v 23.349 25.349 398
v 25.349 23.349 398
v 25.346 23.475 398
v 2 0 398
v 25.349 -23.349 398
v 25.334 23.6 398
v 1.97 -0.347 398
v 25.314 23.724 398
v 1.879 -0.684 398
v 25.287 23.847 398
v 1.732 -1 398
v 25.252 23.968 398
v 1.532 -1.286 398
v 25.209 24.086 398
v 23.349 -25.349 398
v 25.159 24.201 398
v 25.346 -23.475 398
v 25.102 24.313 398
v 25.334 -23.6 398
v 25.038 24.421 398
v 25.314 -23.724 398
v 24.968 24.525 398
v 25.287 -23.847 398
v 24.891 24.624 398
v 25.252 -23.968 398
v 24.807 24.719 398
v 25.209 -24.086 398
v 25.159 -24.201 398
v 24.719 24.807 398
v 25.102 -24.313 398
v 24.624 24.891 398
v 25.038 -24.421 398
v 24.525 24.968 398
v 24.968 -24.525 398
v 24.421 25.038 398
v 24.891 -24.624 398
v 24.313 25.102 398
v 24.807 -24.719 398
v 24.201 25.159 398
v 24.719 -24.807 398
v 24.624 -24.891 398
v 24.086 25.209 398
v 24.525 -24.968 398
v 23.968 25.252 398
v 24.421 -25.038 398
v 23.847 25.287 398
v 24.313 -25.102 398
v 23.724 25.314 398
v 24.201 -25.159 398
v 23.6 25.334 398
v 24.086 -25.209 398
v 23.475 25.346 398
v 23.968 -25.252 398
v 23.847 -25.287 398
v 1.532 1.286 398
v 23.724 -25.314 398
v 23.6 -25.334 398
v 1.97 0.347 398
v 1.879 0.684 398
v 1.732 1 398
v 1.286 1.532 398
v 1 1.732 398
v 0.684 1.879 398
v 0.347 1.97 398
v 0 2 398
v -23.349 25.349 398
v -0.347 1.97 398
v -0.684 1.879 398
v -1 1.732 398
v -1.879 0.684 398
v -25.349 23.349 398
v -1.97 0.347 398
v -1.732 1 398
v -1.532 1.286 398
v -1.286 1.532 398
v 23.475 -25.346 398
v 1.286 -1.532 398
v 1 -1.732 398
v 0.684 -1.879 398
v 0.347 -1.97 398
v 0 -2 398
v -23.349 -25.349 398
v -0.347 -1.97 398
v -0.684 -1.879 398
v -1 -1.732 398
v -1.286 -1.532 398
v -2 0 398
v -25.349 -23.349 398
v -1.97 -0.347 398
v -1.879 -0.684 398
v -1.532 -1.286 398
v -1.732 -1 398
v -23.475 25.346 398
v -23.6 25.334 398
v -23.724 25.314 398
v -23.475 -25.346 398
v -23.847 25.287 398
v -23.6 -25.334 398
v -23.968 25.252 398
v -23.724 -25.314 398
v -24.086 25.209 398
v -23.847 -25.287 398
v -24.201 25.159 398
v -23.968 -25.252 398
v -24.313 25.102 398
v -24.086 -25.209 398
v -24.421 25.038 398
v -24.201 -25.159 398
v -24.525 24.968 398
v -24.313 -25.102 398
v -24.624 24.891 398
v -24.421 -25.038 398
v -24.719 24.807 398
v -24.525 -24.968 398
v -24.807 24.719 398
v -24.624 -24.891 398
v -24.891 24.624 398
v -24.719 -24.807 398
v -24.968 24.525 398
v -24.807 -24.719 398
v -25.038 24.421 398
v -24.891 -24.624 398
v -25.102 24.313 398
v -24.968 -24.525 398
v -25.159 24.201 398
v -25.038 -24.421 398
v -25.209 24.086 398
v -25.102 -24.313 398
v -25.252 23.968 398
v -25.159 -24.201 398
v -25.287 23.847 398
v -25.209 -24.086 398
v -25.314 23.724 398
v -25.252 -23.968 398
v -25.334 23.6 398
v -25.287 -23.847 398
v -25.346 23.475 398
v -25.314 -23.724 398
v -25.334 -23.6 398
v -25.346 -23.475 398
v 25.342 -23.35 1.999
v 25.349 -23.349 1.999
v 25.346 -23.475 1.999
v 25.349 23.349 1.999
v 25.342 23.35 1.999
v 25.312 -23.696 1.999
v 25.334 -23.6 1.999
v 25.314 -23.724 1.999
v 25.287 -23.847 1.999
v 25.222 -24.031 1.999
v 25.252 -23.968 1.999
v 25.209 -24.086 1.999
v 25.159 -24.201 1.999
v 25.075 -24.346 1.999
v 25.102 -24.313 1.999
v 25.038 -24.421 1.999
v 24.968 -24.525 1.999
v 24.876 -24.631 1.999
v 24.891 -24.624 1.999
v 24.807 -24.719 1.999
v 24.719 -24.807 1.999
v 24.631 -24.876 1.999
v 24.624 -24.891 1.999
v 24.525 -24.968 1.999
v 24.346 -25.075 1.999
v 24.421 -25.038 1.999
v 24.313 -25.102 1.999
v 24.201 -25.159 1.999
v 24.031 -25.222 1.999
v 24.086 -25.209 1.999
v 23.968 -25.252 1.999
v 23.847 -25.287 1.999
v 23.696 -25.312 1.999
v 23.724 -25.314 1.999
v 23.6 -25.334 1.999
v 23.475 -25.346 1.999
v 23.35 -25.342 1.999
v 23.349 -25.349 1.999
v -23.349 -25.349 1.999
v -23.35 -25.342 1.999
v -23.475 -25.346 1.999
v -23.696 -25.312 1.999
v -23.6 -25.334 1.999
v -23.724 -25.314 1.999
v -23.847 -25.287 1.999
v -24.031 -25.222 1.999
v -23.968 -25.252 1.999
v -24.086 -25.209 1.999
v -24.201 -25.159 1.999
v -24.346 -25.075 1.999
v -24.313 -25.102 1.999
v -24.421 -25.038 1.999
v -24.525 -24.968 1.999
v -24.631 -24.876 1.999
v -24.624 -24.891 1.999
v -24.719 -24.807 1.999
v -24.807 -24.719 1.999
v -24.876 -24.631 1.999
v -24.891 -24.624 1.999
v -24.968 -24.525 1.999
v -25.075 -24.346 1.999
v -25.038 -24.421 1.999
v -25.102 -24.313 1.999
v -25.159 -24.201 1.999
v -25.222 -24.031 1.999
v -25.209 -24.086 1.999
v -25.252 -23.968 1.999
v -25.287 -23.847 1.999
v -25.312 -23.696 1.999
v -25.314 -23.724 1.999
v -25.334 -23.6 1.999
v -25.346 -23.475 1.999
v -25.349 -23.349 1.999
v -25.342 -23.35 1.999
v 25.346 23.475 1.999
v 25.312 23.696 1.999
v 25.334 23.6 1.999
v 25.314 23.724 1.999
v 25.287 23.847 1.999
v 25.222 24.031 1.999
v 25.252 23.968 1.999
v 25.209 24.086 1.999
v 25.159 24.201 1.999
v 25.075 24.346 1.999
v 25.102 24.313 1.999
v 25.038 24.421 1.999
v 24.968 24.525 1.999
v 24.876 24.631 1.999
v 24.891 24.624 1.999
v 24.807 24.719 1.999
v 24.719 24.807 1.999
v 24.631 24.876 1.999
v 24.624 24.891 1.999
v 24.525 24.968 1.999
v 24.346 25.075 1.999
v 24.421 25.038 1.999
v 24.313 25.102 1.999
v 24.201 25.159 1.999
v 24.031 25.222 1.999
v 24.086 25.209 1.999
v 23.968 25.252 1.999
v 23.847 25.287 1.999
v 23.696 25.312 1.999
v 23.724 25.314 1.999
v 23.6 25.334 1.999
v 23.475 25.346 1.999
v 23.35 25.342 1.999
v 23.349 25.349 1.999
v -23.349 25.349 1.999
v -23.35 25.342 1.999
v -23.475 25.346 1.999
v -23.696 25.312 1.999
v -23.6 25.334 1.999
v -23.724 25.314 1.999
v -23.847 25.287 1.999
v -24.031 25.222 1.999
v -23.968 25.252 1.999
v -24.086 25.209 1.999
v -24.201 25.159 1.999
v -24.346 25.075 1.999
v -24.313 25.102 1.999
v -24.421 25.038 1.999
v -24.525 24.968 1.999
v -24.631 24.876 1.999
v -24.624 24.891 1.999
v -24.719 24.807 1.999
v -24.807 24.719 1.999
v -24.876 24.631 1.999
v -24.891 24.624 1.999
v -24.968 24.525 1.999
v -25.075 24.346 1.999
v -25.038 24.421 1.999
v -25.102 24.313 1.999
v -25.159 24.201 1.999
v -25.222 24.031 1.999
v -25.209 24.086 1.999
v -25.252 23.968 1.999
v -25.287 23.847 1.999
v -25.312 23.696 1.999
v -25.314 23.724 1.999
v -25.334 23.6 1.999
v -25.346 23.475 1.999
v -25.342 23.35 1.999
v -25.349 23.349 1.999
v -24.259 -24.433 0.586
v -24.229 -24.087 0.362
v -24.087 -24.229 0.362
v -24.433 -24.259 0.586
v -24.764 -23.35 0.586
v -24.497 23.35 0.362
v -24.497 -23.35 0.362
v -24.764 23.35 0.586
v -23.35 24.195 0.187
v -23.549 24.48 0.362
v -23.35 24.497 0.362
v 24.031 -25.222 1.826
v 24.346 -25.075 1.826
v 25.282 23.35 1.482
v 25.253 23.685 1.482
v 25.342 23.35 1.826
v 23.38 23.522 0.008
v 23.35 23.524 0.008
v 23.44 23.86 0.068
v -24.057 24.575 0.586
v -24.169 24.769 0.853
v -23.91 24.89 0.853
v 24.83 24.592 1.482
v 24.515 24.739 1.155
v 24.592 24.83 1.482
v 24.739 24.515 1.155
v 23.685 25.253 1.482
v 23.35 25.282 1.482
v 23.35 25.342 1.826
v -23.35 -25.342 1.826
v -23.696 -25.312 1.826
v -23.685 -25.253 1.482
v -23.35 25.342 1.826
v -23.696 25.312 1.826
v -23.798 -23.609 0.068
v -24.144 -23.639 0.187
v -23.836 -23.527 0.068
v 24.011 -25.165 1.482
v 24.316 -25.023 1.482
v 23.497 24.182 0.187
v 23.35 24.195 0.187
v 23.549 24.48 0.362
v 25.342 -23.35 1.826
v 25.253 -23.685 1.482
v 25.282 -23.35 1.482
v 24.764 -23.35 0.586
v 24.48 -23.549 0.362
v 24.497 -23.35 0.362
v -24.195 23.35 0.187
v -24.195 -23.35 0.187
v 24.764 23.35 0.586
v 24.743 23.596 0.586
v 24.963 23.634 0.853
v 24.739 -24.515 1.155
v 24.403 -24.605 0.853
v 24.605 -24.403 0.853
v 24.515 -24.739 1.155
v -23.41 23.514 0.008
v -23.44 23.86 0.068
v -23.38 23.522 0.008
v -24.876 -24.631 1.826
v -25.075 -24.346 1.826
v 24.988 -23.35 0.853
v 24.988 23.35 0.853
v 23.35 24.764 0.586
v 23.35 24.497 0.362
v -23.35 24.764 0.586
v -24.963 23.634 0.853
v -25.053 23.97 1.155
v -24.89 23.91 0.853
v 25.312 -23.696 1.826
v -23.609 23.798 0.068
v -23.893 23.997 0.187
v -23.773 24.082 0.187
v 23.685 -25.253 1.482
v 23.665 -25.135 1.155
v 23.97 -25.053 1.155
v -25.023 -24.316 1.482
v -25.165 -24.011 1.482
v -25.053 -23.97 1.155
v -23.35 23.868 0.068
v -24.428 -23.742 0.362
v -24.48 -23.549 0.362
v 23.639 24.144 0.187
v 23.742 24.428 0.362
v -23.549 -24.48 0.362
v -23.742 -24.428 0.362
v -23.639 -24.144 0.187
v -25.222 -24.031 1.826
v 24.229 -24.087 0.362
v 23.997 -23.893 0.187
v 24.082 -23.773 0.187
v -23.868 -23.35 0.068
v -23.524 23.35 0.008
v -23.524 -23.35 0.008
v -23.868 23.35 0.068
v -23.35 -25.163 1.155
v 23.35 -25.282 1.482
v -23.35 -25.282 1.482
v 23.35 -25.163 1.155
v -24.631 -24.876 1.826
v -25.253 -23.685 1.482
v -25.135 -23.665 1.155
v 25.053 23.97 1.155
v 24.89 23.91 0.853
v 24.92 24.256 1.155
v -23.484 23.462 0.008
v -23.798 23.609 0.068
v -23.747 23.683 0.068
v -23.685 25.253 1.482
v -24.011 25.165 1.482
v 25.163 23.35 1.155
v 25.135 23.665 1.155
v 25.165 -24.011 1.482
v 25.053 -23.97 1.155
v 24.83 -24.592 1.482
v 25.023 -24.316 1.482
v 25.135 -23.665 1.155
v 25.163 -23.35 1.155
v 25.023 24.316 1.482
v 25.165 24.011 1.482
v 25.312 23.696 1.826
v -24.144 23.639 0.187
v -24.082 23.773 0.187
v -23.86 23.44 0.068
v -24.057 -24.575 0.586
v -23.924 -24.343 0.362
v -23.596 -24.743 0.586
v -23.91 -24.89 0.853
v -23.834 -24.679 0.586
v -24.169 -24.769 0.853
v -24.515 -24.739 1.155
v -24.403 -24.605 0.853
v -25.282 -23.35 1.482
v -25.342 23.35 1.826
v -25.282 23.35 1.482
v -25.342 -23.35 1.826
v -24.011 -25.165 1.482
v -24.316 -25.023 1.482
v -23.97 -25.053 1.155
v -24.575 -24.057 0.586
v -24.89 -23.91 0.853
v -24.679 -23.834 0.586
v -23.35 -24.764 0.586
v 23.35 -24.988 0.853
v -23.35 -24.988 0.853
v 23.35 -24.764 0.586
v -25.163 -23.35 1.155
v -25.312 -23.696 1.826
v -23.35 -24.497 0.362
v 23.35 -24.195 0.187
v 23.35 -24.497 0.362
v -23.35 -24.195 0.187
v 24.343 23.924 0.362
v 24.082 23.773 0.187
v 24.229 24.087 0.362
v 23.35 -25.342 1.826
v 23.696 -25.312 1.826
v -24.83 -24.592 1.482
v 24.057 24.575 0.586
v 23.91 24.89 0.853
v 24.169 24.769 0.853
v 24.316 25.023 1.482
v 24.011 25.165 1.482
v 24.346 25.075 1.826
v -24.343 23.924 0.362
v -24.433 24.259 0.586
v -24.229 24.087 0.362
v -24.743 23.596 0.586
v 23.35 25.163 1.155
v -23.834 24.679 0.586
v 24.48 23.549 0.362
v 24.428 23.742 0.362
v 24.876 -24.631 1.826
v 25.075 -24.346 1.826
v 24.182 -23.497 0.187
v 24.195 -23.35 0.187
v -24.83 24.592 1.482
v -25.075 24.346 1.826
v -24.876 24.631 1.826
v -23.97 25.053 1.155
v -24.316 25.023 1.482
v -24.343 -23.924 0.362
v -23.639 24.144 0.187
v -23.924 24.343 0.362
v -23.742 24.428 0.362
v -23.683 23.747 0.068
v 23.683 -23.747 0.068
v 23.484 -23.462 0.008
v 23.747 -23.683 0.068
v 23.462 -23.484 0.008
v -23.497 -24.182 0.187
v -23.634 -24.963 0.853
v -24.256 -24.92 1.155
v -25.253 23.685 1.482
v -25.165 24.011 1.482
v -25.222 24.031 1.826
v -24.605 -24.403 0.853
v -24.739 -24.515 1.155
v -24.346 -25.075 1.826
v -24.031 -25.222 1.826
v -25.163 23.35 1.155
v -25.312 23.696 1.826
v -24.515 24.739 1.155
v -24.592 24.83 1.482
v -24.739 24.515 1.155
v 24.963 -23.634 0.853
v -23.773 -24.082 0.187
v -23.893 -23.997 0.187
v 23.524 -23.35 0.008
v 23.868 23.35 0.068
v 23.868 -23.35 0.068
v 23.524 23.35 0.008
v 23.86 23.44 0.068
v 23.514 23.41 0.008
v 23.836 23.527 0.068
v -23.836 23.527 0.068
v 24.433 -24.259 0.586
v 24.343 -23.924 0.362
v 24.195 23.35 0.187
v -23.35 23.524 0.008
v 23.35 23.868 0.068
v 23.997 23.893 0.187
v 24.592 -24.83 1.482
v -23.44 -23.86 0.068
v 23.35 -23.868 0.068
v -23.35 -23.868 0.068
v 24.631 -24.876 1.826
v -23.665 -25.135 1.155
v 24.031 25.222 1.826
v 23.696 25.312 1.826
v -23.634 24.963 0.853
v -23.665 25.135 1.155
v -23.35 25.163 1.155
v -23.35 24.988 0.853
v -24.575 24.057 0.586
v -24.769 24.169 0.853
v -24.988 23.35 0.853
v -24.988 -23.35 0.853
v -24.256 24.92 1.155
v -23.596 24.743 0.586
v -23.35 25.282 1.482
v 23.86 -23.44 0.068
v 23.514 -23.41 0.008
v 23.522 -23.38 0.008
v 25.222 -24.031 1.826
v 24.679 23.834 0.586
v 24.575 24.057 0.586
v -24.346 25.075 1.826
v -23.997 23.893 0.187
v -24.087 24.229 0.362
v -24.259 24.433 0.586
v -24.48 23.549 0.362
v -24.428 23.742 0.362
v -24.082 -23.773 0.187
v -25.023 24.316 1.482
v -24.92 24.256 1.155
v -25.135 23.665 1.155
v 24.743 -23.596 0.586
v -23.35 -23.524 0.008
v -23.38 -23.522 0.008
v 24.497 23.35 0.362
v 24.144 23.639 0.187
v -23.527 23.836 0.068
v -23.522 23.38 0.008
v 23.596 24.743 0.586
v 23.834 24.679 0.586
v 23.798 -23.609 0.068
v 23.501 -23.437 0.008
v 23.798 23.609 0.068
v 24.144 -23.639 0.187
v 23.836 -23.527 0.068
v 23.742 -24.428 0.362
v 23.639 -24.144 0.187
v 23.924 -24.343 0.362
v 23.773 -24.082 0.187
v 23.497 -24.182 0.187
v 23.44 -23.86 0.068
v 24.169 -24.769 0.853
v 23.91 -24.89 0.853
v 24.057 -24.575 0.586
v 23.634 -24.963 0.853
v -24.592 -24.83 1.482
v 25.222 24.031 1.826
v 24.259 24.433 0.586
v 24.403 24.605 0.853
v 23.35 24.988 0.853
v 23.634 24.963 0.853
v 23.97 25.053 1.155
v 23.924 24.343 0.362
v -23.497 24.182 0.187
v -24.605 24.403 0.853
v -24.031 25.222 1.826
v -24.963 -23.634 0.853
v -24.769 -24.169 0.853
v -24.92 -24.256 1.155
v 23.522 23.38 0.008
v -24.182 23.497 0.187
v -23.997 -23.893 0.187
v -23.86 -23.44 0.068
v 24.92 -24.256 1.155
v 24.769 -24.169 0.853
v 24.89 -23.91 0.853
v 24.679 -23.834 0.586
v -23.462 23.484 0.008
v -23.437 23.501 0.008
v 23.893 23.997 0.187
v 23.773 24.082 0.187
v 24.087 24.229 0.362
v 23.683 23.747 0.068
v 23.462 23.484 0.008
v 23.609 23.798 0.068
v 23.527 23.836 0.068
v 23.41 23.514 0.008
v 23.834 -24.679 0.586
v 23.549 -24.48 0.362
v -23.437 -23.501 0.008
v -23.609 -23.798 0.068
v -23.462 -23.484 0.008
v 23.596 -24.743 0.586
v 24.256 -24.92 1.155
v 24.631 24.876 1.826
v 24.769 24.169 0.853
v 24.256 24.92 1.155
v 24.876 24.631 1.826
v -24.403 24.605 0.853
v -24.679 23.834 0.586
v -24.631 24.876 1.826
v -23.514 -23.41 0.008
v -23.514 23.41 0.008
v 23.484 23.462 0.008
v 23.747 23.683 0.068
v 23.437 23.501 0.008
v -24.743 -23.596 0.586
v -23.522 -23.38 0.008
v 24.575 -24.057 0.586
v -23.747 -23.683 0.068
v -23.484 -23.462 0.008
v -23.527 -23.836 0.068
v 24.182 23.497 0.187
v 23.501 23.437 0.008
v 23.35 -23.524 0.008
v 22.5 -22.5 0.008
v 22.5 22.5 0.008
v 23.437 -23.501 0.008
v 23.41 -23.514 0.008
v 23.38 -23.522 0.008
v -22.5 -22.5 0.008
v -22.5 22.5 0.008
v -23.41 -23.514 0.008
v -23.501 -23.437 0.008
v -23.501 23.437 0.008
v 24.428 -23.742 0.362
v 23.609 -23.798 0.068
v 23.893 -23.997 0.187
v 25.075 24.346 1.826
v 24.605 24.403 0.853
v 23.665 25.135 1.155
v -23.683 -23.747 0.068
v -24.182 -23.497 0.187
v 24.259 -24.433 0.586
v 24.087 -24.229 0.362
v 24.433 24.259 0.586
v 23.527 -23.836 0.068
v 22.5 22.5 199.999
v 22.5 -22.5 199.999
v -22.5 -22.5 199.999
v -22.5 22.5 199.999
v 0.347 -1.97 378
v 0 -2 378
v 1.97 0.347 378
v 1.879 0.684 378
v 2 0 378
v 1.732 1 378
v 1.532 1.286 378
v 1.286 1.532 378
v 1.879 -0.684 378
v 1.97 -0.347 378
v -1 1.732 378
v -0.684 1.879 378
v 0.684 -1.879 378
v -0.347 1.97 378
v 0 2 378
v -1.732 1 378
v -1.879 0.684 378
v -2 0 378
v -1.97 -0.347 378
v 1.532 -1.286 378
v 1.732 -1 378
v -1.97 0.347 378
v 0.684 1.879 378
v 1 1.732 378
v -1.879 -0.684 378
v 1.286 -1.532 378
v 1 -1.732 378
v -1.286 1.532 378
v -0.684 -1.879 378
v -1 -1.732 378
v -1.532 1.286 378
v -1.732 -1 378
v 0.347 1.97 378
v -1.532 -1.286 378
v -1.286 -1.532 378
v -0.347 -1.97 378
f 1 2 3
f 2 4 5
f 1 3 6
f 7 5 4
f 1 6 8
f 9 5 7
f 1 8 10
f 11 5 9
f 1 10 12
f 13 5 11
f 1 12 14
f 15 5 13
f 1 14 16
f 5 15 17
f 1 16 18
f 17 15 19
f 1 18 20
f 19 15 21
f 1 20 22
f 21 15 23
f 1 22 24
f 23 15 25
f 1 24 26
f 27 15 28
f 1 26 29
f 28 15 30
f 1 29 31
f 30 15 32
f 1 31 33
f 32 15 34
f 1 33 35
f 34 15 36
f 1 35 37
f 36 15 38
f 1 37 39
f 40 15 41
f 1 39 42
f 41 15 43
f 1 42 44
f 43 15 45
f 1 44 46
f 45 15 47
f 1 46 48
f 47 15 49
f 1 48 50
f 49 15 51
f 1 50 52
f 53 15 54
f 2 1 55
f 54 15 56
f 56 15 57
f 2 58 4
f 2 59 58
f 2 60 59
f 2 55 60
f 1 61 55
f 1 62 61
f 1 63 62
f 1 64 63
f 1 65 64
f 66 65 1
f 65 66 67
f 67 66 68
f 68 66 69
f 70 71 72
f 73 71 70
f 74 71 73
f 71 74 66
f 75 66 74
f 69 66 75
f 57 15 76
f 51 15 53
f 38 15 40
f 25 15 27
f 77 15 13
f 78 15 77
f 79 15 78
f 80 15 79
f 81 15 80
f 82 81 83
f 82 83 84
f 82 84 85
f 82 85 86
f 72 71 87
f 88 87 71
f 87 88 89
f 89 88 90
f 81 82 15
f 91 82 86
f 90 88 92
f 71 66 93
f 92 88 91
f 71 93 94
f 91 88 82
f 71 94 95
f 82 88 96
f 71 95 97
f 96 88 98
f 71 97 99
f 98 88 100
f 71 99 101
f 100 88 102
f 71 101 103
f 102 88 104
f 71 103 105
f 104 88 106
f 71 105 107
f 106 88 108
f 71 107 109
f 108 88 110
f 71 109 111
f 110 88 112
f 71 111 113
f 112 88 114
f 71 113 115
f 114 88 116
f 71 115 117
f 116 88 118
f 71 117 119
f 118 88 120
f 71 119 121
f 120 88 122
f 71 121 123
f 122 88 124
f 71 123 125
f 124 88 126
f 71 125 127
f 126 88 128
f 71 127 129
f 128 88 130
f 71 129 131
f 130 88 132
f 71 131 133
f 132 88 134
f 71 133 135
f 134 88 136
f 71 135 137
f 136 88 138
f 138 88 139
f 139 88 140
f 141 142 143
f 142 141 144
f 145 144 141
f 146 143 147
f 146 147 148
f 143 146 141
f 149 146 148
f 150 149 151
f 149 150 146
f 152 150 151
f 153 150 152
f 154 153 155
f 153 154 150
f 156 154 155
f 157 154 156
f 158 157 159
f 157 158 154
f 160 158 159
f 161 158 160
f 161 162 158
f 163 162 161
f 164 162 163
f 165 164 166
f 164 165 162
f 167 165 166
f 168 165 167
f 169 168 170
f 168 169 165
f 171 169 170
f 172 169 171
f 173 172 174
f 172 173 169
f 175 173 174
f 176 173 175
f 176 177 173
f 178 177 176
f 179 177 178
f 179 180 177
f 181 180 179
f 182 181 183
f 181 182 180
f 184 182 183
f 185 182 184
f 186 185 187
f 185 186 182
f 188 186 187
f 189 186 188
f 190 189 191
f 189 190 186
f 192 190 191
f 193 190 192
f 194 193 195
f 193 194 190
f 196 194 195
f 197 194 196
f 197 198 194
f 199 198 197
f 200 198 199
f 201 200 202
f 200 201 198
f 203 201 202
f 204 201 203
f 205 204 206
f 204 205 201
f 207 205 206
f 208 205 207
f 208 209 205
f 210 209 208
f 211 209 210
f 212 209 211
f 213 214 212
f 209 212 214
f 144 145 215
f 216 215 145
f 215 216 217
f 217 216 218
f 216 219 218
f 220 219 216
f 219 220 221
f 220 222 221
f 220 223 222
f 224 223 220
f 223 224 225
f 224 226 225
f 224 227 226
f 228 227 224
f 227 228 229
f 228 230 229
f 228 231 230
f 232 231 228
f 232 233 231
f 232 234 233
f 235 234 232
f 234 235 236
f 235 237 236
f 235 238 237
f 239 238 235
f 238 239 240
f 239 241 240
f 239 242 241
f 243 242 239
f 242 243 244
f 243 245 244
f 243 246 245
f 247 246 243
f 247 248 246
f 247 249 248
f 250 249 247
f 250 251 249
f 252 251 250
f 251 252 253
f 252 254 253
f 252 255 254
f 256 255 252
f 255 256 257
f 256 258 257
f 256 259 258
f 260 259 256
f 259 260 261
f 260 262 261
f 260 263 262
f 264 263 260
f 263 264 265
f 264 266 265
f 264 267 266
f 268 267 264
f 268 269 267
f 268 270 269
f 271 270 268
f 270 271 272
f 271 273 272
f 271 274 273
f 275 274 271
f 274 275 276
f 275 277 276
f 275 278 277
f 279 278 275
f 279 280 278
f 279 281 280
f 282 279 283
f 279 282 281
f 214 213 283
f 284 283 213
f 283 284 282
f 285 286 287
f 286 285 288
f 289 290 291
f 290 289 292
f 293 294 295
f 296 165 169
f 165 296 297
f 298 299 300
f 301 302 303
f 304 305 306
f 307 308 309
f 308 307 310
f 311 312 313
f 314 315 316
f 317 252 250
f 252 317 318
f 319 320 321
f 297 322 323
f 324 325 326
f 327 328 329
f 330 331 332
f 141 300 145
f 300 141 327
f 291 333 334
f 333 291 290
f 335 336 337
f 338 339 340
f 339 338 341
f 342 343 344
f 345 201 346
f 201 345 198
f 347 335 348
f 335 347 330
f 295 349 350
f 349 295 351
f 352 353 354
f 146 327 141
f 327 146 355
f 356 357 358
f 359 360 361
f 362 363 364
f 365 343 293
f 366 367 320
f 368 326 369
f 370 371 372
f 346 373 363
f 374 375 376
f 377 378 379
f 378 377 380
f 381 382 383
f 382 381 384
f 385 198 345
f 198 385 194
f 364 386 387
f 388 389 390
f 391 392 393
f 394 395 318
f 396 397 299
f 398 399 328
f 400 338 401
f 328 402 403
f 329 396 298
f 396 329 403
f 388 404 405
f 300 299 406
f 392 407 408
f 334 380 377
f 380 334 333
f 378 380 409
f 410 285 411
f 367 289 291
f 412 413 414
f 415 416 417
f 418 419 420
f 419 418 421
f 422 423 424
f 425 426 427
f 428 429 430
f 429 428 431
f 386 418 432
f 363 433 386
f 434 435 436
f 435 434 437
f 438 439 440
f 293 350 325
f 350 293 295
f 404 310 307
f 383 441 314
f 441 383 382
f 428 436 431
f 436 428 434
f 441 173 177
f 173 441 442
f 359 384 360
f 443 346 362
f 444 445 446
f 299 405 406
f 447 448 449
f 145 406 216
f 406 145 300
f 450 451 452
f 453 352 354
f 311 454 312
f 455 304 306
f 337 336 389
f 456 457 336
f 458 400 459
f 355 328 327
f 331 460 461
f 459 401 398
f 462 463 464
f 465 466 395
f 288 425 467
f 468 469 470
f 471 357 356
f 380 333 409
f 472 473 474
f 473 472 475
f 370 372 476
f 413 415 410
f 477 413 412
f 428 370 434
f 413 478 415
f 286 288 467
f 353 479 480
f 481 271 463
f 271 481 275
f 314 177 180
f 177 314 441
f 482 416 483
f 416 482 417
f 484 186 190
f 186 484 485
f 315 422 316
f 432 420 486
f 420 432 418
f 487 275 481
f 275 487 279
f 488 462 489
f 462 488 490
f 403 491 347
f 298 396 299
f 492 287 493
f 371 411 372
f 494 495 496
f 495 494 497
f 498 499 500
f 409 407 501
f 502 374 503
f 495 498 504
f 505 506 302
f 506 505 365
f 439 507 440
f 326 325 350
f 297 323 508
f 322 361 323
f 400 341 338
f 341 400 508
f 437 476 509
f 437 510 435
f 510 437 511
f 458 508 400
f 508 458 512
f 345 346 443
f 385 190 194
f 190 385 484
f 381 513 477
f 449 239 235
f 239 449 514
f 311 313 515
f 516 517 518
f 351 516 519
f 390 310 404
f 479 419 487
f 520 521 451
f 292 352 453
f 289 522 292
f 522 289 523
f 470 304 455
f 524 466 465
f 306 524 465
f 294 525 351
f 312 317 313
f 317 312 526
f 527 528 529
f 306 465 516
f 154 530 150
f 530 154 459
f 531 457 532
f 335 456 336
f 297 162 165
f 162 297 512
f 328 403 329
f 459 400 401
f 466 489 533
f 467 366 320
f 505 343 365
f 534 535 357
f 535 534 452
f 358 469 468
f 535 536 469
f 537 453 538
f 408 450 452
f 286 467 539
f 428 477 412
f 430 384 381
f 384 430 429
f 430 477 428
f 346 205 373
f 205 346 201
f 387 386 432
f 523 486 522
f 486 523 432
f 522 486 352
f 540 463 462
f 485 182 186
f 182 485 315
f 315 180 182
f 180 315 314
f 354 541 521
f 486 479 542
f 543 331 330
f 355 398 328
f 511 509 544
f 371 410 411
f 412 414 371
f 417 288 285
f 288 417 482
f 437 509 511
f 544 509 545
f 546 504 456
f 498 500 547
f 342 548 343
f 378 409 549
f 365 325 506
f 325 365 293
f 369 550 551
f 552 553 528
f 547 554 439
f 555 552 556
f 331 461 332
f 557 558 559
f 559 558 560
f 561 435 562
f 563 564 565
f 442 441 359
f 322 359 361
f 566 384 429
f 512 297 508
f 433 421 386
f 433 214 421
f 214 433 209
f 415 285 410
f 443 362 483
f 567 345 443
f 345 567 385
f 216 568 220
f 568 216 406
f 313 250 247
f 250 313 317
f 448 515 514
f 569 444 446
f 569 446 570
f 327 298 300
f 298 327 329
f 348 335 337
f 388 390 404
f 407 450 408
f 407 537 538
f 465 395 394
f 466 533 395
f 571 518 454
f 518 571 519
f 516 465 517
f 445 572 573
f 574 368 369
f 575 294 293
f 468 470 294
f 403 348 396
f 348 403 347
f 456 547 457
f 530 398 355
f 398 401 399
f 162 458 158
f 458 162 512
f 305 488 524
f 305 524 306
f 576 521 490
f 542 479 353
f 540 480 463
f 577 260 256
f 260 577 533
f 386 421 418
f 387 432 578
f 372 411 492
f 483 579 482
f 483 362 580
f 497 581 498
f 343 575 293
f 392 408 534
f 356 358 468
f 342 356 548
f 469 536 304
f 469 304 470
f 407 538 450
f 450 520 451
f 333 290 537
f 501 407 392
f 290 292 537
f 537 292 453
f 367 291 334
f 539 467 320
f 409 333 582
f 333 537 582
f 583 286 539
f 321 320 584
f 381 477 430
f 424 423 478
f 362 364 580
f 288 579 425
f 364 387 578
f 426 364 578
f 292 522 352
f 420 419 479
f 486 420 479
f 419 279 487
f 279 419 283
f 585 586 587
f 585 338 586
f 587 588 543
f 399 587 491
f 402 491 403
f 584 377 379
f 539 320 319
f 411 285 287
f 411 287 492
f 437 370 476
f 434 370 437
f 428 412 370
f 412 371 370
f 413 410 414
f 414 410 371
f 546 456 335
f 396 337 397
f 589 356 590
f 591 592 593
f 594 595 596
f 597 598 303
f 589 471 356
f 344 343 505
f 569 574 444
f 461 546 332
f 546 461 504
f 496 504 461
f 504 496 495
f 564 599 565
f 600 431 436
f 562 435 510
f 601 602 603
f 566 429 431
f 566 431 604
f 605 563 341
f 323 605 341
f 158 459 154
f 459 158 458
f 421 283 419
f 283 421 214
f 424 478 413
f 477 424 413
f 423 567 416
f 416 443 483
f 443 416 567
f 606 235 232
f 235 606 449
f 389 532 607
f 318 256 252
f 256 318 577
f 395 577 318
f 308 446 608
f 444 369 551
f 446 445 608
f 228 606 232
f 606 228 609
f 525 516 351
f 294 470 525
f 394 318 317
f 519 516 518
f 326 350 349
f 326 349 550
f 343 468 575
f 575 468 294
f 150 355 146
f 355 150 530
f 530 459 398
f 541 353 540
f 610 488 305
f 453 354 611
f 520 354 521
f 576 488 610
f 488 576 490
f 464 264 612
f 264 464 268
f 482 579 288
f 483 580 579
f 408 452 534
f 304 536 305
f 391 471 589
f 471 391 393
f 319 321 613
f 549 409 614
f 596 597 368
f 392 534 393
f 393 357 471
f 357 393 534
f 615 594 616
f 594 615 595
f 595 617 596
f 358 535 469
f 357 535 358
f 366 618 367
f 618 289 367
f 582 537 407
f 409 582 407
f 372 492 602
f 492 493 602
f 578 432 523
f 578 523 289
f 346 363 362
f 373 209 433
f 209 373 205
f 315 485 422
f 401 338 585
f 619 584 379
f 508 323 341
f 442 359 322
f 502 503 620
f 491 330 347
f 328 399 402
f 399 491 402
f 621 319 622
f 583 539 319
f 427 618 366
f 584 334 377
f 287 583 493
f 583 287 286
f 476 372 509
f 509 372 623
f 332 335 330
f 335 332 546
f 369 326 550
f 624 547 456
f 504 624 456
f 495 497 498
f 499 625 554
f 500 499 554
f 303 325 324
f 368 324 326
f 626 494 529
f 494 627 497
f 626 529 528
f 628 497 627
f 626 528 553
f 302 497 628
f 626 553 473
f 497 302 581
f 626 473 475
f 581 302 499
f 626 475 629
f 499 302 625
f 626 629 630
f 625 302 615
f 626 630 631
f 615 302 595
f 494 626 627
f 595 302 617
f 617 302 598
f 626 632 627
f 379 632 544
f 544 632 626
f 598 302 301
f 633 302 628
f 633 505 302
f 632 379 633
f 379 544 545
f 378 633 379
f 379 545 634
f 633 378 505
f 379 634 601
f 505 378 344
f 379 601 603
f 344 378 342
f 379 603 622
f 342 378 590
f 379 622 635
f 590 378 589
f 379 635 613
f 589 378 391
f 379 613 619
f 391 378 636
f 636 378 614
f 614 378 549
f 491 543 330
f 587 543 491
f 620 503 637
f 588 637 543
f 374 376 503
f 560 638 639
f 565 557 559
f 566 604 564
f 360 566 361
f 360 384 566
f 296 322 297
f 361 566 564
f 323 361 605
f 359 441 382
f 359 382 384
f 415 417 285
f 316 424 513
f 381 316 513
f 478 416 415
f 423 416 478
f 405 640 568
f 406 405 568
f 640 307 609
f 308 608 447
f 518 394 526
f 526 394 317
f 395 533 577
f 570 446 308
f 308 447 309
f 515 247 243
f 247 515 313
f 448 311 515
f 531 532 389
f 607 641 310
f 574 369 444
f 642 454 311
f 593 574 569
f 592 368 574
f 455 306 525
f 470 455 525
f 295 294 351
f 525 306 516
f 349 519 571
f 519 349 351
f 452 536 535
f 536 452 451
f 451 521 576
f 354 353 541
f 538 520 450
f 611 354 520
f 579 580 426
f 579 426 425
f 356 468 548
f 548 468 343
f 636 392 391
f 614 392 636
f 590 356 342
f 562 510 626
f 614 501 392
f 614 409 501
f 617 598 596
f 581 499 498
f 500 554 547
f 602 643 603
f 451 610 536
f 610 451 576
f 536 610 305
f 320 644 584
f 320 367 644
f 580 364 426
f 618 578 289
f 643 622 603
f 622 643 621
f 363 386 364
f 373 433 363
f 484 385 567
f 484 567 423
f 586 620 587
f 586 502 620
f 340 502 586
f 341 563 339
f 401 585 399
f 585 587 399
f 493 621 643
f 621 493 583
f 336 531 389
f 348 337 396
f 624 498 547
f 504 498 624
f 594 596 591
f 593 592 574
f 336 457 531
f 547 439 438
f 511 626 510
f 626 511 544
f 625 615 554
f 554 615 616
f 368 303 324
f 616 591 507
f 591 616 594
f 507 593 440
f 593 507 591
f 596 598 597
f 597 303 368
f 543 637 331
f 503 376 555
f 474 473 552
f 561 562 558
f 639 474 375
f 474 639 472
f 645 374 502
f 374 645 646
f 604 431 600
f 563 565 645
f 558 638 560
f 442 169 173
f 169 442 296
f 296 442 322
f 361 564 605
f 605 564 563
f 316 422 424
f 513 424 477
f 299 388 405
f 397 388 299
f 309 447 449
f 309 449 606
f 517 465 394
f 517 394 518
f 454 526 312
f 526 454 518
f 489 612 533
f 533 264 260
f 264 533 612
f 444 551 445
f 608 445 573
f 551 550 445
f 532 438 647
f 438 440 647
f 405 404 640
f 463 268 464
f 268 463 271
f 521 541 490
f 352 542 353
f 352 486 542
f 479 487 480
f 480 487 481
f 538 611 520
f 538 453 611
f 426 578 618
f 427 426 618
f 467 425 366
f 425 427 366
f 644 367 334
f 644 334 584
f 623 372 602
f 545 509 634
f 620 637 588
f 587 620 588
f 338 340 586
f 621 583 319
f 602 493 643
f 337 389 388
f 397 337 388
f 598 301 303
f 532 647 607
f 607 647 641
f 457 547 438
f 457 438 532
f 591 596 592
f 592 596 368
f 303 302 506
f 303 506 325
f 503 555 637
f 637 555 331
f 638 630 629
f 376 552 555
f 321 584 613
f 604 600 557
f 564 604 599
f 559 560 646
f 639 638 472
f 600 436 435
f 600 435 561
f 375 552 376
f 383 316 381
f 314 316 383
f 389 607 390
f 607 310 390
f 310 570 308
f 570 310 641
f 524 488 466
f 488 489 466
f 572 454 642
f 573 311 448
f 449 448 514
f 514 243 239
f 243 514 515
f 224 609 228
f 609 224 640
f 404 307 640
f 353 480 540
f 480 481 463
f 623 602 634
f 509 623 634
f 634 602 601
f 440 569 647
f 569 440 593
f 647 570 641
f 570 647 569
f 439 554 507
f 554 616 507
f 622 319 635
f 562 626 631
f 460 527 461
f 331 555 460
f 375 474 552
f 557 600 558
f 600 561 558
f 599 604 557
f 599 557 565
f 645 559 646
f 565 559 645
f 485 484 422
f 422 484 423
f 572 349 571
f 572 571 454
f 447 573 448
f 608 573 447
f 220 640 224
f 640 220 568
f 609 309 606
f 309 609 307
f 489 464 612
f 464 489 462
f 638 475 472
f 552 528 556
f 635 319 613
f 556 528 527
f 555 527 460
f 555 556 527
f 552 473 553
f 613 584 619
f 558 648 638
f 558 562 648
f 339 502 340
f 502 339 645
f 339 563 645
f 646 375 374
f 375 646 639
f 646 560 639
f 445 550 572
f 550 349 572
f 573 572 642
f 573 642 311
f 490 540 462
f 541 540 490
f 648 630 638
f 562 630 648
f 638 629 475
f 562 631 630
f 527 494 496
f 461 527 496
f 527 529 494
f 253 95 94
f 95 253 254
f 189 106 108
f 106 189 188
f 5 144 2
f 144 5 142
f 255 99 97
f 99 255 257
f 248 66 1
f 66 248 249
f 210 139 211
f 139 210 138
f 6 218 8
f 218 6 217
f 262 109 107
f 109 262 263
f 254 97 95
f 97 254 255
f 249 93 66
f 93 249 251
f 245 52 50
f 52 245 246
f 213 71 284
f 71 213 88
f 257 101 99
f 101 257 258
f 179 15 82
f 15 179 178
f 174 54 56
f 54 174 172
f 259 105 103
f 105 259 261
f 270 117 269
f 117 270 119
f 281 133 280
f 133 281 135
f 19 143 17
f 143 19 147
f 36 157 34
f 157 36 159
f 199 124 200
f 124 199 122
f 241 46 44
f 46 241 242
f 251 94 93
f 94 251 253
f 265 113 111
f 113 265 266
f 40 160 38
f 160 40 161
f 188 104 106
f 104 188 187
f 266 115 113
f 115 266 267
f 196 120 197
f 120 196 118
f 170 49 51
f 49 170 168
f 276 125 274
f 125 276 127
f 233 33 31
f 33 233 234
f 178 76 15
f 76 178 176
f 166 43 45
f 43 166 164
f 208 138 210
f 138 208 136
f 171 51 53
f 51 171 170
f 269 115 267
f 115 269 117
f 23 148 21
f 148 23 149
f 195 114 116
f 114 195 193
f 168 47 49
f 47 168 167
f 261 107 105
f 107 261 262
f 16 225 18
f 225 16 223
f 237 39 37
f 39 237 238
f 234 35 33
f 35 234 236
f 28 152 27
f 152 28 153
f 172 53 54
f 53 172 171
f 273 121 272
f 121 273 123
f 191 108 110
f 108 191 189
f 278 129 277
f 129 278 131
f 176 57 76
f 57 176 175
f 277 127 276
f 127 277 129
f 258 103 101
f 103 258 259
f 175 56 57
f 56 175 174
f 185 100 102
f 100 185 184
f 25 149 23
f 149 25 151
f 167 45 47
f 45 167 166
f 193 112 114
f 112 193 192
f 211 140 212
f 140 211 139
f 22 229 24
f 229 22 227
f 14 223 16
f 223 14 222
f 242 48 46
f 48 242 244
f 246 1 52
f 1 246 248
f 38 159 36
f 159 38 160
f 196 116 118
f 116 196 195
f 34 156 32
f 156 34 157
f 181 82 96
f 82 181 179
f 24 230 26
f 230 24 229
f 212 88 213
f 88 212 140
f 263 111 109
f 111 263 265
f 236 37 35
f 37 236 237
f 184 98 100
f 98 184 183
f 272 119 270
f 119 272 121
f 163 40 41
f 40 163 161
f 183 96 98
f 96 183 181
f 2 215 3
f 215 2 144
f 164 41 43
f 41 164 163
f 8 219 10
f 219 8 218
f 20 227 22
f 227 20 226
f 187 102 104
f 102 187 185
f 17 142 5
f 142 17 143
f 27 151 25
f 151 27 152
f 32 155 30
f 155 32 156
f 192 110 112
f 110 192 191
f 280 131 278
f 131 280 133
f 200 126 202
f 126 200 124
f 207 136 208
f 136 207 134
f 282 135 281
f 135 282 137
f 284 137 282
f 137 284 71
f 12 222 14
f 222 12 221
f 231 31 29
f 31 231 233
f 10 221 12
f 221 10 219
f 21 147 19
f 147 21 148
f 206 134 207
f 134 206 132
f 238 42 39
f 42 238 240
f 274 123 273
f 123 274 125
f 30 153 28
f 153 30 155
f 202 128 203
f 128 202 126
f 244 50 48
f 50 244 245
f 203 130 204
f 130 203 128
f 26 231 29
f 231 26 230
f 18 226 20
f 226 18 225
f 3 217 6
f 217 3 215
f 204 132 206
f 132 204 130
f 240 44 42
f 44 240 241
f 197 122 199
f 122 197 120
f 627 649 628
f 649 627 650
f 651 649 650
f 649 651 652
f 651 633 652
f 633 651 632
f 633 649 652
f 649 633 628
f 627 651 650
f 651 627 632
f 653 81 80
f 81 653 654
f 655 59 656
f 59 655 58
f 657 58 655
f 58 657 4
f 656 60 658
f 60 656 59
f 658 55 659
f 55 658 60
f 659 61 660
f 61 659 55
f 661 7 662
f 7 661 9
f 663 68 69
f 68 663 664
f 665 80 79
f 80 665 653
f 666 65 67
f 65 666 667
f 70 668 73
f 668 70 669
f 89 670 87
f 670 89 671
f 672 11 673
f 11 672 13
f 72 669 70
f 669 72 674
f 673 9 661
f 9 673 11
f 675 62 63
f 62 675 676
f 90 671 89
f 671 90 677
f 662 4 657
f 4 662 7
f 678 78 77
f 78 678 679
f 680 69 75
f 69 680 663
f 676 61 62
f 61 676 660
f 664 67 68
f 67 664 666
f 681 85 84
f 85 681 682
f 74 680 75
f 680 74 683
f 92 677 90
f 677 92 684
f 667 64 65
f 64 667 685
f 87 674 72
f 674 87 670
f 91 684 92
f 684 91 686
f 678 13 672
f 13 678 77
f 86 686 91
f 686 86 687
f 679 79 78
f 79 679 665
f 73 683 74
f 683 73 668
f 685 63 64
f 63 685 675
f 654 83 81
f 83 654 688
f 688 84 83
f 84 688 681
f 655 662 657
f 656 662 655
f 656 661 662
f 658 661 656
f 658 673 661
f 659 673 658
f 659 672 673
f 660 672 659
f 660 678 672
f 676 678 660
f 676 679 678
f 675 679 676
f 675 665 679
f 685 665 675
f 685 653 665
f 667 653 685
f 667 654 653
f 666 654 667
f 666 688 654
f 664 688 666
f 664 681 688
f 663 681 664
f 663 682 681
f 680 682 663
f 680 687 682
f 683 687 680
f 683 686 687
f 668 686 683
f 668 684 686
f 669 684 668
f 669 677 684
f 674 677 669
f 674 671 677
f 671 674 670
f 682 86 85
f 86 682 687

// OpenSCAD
// parameters for the lack leg
inner = 45;   // inner width of leg
outer = 50.7; // outer width of leg
bcr = 2;    // bottom corner radius (y-z and x-z planes) of the lack leg
cr = 2;       // corner radius of main lack leg corners (x-y plane)

epsilon = 0.001; // hack to fix overlapping points

// defines the boundary between the leg joining interface and the main body
baseoffset = 5;

// Draw the leg above the insert for scale comparison
lack_leg();

// A leg for an Ikea Lack table
module lack_leg() {
    // outer width is 50.6-50.7 mm on each side
    h = 398;      // leg height
    inner = 45;   // inner width of leg
    outer = 50.7; // outer width of leg
    bcr = 2;      // bottom corner radius (y-z and x-z planes) of the lack leg
    cr = 2;       // corner radius of main lack leg corners (x-y plane)

    // inner cross section is 45mm, some padding for horizontal expansion to ensure fit
    innerw = inner - 0.15; //
    zcutout = 200; // vertically remove this amount of the core from the bottom

    difference() {
        // main leg body
        rounded_base_cuboid(outer,outer,h,bcr);

        // minus outer mask to ensure curved corners
        lackleg_outer_mask(outer-epsilon,outer-epsilon,h);

        // minus inner filler (cuboid at base)
        translate([0,0,(zcutout/2)-epsilon]) cube([inner,inner,zcutout+epsilon], center=true);

        // centre hole at top
        translate([0,0,h-20]) cylinder(d=4, h=21, $fn=36);
    }


}

// forms a cuboid with a rounded cuboid removed, to use as a vertical mask
module lackleg_outer_mask(w,d,h) {
    difference() {
        translate([0,0,(h)/2])
            cube([w+20,d+20, h+2], center=true); // 1mm extra top and bottom for clipping
        translate([0,0,-2])
            plate(w,d,h+4,2);
    }
}

module rounded_base_cuboid(w, d, h, cr) {
    union() {
        // main body of cuboid
        translate([0,0,cr-epsilon])
            plate(w,d,h-cr+epsilon,cr);

        // rounded bottom
        translate([-w/2,-d/2,cr])
            hull() {
                translate([0+cr,0+cr,0]) sphere(r=cr,$fn=36);
                translate([w-cr,0+cr,0]) sphere(r=cr,$fn=36);
                translate([0+cr,d-cr,0]) sphere(r=cr,$fn=36);
                translate([w-cr,d-cr,0]) sphere(r=cr,$fn=36);
            }
    }
}

module plate(width, depth, thickness, corner_radius) {
    points = [
        [corner_radius,corner_radius,0],
        [corner_radius,depth-corner_radius,0],
        [width-corner_radius,corner_radius,0],
        [width-corner_radius,depth-corner_radius,0]
    ];
    d = corner_radius*2;
    translate([-width/2,-depth/2,thickness/2]) roundedplate(points, d, thickness);
}


module cylinders(points, diameter, thickness){
    for (p=points){
        translate(p) cylinder(d=diameter, h=thickness, center=true, $fn=100);
    }
}

module roundedplate(points, diameter, thickness){
    hull()
        cylinders(points, diameter, thickness);
}
